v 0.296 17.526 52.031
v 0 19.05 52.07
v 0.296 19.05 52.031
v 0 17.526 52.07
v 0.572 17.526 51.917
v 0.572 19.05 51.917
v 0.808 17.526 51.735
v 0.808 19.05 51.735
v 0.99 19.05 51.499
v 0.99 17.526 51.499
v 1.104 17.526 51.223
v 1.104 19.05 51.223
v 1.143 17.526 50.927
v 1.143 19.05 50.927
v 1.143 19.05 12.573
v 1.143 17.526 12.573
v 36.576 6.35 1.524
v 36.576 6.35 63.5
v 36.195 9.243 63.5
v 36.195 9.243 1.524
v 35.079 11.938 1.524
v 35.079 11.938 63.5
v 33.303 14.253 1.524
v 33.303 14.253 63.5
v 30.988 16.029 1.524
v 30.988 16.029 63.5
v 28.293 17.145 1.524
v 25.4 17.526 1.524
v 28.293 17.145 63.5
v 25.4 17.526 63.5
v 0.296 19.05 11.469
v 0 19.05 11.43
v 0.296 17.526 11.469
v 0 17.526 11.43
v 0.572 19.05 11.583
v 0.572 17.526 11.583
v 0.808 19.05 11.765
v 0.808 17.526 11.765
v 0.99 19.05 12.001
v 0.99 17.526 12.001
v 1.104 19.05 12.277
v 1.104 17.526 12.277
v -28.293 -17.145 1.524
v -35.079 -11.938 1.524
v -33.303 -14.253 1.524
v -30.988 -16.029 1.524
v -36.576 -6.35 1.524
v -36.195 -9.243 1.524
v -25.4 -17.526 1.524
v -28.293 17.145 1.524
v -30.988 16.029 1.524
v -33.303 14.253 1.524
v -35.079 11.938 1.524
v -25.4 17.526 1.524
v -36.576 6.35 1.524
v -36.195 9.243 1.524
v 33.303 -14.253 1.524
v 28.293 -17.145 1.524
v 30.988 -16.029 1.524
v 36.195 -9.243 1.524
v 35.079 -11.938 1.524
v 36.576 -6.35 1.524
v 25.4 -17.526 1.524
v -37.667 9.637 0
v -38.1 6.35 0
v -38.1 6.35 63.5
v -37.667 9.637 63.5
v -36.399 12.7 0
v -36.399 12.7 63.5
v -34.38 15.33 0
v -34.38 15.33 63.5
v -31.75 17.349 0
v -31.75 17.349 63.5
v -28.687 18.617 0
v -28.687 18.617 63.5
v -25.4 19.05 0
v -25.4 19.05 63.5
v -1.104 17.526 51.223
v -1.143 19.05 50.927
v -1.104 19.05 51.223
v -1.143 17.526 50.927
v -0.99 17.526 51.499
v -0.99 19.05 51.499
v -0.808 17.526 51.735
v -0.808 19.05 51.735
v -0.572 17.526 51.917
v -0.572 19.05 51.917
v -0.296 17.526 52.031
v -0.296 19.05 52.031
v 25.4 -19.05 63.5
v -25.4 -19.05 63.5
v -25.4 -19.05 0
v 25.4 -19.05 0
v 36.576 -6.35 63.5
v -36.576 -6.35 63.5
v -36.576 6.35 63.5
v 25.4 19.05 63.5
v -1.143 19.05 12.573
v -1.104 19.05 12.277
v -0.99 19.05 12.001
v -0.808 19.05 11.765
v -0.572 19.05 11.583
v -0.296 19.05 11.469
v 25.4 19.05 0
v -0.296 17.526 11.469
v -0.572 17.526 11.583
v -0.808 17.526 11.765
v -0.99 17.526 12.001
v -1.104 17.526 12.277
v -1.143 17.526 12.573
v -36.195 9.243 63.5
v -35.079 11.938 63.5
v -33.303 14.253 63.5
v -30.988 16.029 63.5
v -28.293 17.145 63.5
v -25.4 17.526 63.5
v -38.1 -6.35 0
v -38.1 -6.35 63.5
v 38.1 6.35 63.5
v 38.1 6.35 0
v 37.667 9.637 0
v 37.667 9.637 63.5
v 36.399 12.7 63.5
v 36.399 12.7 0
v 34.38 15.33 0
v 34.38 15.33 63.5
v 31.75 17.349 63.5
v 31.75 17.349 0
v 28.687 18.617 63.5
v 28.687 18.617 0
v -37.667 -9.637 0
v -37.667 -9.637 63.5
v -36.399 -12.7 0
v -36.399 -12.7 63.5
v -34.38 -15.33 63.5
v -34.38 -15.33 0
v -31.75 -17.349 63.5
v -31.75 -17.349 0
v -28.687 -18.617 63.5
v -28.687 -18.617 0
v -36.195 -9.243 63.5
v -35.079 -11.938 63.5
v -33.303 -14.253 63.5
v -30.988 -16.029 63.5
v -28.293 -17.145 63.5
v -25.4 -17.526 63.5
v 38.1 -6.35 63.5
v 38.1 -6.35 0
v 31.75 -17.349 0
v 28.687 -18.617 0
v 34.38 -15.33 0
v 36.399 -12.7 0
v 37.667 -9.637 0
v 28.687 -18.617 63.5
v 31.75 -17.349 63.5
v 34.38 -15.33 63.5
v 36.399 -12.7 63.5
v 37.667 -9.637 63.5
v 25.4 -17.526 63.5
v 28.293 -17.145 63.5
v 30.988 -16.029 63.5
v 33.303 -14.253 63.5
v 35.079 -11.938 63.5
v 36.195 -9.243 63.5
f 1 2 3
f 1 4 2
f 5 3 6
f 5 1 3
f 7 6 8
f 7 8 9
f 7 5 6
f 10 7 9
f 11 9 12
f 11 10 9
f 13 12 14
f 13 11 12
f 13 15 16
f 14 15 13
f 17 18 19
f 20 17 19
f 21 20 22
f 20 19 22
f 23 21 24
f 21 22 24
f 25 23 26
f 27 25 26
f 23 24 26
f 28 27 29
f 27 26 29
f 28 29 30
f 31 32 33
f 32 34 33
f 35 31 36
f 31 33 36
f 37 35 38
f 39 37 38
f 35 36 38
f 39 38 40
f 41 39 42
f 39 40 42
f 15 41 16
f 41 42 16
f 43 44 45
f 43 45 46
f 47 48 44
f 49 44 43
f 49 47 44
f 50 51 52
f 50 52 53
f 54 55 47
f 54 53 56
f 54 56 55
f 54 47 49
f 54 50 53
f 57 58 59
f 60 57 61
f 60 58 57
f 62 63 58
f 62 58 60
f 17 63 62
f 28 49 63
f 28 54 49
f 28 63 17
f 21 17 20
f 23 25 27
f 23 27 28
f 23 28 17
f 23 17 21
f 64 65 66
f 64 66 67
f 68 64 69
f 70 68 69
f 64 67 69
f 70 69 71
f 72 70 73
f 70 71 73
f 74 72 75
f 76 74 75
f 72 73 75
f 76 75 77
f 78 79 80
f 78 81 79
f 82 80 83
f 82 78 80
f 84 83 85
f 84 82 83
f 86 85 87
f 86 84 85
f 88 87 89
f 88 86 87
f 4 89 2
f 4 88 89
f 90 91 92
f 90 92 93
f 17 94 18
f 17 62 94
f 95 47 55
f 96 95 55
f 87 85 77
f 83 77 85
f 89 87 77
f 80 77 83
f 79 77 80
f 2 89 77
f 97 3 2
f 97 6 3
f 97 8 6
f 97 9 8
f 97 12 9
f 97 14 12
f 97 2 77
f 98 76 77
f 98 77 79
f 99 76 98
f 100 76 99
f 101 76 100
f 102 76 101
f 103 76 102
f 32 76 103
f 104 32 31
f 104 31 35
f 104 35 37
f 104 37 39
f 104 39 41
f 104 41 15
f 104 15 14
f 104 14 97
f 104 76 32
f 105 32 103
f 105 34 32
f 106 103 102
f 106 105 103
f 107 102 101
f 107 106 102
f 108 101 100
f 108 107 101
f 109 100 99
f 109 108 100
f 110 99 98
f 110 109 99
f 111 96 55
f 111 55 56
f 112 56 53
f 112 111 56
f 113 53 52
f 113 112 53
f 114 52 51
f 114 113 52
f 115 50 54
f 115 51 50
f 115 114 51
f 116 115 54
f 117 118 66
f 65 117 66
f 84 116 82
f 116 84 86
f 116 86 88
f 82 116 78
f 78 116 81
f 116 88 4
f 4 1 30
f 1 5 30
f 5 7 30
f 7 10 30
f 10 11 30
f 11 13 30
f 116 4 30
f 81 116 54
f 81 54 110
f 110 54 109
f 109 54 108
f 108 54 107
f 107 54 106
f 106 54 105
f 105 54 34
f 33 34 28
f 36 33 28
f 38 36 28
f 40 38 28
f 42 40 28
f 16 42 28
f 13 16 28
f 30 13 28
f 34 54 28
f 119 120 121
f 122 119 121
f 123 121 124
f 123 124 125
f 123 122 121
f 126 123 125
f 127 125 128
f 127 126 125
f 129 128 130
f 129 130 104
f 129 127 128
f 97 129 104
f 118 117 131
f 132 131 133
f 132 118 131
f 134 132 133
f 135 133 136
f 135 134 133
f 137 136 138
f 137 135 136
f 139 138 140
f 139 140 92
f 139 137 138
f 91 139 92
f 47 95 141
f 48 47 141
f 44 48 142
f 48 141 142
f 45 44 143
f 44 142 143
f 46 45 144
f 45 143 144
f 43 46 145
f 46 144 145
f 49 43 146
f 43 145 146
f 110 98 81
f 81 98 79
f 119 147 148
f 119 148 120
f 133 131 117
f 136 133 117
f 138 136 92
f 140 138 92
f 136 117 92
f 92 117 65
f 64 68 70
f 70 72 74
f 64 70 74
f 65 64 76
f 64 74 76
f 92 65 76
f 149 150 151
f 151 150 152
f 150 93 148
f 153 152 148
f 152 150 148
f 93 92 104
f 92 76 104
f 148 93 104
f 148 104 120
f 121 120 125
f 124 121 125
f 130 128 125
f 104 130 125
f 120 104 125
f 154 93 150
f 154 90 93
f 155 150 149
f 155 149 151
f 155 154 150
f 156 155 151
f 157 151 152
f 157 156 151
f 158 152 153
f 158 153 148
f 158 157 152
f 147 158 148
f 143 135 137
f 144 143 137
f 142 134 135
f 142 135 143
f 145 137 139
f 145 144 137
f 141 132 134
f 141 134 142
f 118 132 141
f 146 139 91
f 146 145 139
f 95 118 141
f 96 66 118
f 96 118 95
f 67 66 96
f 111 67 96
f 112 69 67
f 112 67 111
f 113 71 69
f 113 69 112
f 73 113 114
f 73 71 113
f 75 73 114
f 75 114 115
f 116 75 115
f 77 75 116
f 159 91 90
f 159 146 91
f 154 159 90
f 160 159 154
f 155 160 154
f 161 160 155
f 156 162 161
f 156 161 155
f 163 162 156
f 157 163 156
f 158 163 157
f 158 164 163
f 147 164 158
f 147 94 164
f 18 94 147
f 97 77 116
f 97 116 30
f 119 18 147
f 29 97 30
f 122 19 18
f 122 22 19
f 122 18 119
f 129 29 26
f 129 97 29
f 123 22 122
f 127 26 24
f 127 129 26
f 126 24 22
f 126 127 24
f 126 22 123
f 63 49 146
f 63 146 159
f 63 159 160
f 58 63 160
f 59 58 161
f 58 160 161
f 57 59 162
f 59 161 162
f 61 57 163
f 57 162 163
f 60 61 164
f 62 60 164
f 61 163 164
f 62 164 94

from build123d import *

# Parameters (mm, degrees)
F0_W     = 76.2
F0_H     = 38.1
F1_DEPTH = 63.5
F2_R     = 12.7
F3_T     = -1.524
F4_W     = 2.286
F4_H     = 40.64
F5_DEPTH = 1.524
F6_R     = 1.14299


# Not quite as in the source:
# - a fillet or chamfer is up to 0.001 mm smaller than in the source, because OpenCascade refuses the exact size


with BuildPart() as f1:
    # F0 (on Top) → F1 (new body)
    with BuildSketch(Plane.XY):
        Rectangle(F0_W, F0_H)
    extrude(amount=F1_DEPTH)

    # F2
    f2_edges = [f1.edges().sort_by_distance(p)[0] for p in [
        (38.1, -19.05, 31.75),
        (38.1, 19.05, 31.75),
        (-38.1, -19.05, 31.75),
        (-38.1, 19.05, 31.75),
    ]]
    fillet(f2_edges, radius=F2_R)

    # F3
    f3_openings = [f1.faces().sort_by_distance(p)[0] for p in [
        (0, 0, 63.5),
    ]]
    offset(amount=F3_T, openings=f3_openings)

    # F4 (on face) → F5 (cut, through all)
    with BuildSketch(Plane(origin=(0, 19.05, 0), x_dir=(-1, 0, 0), z_dir=(0, 1, 0))):
        with Locations((0, 31.75)):
            Rectangle(F4_W, F4_H)
    extrude(amount=-F5_DEPTH, mode=Mode.SUBTRACT)

    # F6 (radius 1.143 in the source; OpenCascade refuses exactly that, so slightly less here)
    f6_edges = [f1.edges().sort_by_distance(p)[0] for p in [
        (1.143, 18.288, 52.07),
        (-1.143, 18.288, 52.07),
        (1.143, 18.288, 11.43),
        (-1.143, 18.288, 11.43),
    ]]
    fillet(f6_edges, radius=F6_R)


solid = f1.part
